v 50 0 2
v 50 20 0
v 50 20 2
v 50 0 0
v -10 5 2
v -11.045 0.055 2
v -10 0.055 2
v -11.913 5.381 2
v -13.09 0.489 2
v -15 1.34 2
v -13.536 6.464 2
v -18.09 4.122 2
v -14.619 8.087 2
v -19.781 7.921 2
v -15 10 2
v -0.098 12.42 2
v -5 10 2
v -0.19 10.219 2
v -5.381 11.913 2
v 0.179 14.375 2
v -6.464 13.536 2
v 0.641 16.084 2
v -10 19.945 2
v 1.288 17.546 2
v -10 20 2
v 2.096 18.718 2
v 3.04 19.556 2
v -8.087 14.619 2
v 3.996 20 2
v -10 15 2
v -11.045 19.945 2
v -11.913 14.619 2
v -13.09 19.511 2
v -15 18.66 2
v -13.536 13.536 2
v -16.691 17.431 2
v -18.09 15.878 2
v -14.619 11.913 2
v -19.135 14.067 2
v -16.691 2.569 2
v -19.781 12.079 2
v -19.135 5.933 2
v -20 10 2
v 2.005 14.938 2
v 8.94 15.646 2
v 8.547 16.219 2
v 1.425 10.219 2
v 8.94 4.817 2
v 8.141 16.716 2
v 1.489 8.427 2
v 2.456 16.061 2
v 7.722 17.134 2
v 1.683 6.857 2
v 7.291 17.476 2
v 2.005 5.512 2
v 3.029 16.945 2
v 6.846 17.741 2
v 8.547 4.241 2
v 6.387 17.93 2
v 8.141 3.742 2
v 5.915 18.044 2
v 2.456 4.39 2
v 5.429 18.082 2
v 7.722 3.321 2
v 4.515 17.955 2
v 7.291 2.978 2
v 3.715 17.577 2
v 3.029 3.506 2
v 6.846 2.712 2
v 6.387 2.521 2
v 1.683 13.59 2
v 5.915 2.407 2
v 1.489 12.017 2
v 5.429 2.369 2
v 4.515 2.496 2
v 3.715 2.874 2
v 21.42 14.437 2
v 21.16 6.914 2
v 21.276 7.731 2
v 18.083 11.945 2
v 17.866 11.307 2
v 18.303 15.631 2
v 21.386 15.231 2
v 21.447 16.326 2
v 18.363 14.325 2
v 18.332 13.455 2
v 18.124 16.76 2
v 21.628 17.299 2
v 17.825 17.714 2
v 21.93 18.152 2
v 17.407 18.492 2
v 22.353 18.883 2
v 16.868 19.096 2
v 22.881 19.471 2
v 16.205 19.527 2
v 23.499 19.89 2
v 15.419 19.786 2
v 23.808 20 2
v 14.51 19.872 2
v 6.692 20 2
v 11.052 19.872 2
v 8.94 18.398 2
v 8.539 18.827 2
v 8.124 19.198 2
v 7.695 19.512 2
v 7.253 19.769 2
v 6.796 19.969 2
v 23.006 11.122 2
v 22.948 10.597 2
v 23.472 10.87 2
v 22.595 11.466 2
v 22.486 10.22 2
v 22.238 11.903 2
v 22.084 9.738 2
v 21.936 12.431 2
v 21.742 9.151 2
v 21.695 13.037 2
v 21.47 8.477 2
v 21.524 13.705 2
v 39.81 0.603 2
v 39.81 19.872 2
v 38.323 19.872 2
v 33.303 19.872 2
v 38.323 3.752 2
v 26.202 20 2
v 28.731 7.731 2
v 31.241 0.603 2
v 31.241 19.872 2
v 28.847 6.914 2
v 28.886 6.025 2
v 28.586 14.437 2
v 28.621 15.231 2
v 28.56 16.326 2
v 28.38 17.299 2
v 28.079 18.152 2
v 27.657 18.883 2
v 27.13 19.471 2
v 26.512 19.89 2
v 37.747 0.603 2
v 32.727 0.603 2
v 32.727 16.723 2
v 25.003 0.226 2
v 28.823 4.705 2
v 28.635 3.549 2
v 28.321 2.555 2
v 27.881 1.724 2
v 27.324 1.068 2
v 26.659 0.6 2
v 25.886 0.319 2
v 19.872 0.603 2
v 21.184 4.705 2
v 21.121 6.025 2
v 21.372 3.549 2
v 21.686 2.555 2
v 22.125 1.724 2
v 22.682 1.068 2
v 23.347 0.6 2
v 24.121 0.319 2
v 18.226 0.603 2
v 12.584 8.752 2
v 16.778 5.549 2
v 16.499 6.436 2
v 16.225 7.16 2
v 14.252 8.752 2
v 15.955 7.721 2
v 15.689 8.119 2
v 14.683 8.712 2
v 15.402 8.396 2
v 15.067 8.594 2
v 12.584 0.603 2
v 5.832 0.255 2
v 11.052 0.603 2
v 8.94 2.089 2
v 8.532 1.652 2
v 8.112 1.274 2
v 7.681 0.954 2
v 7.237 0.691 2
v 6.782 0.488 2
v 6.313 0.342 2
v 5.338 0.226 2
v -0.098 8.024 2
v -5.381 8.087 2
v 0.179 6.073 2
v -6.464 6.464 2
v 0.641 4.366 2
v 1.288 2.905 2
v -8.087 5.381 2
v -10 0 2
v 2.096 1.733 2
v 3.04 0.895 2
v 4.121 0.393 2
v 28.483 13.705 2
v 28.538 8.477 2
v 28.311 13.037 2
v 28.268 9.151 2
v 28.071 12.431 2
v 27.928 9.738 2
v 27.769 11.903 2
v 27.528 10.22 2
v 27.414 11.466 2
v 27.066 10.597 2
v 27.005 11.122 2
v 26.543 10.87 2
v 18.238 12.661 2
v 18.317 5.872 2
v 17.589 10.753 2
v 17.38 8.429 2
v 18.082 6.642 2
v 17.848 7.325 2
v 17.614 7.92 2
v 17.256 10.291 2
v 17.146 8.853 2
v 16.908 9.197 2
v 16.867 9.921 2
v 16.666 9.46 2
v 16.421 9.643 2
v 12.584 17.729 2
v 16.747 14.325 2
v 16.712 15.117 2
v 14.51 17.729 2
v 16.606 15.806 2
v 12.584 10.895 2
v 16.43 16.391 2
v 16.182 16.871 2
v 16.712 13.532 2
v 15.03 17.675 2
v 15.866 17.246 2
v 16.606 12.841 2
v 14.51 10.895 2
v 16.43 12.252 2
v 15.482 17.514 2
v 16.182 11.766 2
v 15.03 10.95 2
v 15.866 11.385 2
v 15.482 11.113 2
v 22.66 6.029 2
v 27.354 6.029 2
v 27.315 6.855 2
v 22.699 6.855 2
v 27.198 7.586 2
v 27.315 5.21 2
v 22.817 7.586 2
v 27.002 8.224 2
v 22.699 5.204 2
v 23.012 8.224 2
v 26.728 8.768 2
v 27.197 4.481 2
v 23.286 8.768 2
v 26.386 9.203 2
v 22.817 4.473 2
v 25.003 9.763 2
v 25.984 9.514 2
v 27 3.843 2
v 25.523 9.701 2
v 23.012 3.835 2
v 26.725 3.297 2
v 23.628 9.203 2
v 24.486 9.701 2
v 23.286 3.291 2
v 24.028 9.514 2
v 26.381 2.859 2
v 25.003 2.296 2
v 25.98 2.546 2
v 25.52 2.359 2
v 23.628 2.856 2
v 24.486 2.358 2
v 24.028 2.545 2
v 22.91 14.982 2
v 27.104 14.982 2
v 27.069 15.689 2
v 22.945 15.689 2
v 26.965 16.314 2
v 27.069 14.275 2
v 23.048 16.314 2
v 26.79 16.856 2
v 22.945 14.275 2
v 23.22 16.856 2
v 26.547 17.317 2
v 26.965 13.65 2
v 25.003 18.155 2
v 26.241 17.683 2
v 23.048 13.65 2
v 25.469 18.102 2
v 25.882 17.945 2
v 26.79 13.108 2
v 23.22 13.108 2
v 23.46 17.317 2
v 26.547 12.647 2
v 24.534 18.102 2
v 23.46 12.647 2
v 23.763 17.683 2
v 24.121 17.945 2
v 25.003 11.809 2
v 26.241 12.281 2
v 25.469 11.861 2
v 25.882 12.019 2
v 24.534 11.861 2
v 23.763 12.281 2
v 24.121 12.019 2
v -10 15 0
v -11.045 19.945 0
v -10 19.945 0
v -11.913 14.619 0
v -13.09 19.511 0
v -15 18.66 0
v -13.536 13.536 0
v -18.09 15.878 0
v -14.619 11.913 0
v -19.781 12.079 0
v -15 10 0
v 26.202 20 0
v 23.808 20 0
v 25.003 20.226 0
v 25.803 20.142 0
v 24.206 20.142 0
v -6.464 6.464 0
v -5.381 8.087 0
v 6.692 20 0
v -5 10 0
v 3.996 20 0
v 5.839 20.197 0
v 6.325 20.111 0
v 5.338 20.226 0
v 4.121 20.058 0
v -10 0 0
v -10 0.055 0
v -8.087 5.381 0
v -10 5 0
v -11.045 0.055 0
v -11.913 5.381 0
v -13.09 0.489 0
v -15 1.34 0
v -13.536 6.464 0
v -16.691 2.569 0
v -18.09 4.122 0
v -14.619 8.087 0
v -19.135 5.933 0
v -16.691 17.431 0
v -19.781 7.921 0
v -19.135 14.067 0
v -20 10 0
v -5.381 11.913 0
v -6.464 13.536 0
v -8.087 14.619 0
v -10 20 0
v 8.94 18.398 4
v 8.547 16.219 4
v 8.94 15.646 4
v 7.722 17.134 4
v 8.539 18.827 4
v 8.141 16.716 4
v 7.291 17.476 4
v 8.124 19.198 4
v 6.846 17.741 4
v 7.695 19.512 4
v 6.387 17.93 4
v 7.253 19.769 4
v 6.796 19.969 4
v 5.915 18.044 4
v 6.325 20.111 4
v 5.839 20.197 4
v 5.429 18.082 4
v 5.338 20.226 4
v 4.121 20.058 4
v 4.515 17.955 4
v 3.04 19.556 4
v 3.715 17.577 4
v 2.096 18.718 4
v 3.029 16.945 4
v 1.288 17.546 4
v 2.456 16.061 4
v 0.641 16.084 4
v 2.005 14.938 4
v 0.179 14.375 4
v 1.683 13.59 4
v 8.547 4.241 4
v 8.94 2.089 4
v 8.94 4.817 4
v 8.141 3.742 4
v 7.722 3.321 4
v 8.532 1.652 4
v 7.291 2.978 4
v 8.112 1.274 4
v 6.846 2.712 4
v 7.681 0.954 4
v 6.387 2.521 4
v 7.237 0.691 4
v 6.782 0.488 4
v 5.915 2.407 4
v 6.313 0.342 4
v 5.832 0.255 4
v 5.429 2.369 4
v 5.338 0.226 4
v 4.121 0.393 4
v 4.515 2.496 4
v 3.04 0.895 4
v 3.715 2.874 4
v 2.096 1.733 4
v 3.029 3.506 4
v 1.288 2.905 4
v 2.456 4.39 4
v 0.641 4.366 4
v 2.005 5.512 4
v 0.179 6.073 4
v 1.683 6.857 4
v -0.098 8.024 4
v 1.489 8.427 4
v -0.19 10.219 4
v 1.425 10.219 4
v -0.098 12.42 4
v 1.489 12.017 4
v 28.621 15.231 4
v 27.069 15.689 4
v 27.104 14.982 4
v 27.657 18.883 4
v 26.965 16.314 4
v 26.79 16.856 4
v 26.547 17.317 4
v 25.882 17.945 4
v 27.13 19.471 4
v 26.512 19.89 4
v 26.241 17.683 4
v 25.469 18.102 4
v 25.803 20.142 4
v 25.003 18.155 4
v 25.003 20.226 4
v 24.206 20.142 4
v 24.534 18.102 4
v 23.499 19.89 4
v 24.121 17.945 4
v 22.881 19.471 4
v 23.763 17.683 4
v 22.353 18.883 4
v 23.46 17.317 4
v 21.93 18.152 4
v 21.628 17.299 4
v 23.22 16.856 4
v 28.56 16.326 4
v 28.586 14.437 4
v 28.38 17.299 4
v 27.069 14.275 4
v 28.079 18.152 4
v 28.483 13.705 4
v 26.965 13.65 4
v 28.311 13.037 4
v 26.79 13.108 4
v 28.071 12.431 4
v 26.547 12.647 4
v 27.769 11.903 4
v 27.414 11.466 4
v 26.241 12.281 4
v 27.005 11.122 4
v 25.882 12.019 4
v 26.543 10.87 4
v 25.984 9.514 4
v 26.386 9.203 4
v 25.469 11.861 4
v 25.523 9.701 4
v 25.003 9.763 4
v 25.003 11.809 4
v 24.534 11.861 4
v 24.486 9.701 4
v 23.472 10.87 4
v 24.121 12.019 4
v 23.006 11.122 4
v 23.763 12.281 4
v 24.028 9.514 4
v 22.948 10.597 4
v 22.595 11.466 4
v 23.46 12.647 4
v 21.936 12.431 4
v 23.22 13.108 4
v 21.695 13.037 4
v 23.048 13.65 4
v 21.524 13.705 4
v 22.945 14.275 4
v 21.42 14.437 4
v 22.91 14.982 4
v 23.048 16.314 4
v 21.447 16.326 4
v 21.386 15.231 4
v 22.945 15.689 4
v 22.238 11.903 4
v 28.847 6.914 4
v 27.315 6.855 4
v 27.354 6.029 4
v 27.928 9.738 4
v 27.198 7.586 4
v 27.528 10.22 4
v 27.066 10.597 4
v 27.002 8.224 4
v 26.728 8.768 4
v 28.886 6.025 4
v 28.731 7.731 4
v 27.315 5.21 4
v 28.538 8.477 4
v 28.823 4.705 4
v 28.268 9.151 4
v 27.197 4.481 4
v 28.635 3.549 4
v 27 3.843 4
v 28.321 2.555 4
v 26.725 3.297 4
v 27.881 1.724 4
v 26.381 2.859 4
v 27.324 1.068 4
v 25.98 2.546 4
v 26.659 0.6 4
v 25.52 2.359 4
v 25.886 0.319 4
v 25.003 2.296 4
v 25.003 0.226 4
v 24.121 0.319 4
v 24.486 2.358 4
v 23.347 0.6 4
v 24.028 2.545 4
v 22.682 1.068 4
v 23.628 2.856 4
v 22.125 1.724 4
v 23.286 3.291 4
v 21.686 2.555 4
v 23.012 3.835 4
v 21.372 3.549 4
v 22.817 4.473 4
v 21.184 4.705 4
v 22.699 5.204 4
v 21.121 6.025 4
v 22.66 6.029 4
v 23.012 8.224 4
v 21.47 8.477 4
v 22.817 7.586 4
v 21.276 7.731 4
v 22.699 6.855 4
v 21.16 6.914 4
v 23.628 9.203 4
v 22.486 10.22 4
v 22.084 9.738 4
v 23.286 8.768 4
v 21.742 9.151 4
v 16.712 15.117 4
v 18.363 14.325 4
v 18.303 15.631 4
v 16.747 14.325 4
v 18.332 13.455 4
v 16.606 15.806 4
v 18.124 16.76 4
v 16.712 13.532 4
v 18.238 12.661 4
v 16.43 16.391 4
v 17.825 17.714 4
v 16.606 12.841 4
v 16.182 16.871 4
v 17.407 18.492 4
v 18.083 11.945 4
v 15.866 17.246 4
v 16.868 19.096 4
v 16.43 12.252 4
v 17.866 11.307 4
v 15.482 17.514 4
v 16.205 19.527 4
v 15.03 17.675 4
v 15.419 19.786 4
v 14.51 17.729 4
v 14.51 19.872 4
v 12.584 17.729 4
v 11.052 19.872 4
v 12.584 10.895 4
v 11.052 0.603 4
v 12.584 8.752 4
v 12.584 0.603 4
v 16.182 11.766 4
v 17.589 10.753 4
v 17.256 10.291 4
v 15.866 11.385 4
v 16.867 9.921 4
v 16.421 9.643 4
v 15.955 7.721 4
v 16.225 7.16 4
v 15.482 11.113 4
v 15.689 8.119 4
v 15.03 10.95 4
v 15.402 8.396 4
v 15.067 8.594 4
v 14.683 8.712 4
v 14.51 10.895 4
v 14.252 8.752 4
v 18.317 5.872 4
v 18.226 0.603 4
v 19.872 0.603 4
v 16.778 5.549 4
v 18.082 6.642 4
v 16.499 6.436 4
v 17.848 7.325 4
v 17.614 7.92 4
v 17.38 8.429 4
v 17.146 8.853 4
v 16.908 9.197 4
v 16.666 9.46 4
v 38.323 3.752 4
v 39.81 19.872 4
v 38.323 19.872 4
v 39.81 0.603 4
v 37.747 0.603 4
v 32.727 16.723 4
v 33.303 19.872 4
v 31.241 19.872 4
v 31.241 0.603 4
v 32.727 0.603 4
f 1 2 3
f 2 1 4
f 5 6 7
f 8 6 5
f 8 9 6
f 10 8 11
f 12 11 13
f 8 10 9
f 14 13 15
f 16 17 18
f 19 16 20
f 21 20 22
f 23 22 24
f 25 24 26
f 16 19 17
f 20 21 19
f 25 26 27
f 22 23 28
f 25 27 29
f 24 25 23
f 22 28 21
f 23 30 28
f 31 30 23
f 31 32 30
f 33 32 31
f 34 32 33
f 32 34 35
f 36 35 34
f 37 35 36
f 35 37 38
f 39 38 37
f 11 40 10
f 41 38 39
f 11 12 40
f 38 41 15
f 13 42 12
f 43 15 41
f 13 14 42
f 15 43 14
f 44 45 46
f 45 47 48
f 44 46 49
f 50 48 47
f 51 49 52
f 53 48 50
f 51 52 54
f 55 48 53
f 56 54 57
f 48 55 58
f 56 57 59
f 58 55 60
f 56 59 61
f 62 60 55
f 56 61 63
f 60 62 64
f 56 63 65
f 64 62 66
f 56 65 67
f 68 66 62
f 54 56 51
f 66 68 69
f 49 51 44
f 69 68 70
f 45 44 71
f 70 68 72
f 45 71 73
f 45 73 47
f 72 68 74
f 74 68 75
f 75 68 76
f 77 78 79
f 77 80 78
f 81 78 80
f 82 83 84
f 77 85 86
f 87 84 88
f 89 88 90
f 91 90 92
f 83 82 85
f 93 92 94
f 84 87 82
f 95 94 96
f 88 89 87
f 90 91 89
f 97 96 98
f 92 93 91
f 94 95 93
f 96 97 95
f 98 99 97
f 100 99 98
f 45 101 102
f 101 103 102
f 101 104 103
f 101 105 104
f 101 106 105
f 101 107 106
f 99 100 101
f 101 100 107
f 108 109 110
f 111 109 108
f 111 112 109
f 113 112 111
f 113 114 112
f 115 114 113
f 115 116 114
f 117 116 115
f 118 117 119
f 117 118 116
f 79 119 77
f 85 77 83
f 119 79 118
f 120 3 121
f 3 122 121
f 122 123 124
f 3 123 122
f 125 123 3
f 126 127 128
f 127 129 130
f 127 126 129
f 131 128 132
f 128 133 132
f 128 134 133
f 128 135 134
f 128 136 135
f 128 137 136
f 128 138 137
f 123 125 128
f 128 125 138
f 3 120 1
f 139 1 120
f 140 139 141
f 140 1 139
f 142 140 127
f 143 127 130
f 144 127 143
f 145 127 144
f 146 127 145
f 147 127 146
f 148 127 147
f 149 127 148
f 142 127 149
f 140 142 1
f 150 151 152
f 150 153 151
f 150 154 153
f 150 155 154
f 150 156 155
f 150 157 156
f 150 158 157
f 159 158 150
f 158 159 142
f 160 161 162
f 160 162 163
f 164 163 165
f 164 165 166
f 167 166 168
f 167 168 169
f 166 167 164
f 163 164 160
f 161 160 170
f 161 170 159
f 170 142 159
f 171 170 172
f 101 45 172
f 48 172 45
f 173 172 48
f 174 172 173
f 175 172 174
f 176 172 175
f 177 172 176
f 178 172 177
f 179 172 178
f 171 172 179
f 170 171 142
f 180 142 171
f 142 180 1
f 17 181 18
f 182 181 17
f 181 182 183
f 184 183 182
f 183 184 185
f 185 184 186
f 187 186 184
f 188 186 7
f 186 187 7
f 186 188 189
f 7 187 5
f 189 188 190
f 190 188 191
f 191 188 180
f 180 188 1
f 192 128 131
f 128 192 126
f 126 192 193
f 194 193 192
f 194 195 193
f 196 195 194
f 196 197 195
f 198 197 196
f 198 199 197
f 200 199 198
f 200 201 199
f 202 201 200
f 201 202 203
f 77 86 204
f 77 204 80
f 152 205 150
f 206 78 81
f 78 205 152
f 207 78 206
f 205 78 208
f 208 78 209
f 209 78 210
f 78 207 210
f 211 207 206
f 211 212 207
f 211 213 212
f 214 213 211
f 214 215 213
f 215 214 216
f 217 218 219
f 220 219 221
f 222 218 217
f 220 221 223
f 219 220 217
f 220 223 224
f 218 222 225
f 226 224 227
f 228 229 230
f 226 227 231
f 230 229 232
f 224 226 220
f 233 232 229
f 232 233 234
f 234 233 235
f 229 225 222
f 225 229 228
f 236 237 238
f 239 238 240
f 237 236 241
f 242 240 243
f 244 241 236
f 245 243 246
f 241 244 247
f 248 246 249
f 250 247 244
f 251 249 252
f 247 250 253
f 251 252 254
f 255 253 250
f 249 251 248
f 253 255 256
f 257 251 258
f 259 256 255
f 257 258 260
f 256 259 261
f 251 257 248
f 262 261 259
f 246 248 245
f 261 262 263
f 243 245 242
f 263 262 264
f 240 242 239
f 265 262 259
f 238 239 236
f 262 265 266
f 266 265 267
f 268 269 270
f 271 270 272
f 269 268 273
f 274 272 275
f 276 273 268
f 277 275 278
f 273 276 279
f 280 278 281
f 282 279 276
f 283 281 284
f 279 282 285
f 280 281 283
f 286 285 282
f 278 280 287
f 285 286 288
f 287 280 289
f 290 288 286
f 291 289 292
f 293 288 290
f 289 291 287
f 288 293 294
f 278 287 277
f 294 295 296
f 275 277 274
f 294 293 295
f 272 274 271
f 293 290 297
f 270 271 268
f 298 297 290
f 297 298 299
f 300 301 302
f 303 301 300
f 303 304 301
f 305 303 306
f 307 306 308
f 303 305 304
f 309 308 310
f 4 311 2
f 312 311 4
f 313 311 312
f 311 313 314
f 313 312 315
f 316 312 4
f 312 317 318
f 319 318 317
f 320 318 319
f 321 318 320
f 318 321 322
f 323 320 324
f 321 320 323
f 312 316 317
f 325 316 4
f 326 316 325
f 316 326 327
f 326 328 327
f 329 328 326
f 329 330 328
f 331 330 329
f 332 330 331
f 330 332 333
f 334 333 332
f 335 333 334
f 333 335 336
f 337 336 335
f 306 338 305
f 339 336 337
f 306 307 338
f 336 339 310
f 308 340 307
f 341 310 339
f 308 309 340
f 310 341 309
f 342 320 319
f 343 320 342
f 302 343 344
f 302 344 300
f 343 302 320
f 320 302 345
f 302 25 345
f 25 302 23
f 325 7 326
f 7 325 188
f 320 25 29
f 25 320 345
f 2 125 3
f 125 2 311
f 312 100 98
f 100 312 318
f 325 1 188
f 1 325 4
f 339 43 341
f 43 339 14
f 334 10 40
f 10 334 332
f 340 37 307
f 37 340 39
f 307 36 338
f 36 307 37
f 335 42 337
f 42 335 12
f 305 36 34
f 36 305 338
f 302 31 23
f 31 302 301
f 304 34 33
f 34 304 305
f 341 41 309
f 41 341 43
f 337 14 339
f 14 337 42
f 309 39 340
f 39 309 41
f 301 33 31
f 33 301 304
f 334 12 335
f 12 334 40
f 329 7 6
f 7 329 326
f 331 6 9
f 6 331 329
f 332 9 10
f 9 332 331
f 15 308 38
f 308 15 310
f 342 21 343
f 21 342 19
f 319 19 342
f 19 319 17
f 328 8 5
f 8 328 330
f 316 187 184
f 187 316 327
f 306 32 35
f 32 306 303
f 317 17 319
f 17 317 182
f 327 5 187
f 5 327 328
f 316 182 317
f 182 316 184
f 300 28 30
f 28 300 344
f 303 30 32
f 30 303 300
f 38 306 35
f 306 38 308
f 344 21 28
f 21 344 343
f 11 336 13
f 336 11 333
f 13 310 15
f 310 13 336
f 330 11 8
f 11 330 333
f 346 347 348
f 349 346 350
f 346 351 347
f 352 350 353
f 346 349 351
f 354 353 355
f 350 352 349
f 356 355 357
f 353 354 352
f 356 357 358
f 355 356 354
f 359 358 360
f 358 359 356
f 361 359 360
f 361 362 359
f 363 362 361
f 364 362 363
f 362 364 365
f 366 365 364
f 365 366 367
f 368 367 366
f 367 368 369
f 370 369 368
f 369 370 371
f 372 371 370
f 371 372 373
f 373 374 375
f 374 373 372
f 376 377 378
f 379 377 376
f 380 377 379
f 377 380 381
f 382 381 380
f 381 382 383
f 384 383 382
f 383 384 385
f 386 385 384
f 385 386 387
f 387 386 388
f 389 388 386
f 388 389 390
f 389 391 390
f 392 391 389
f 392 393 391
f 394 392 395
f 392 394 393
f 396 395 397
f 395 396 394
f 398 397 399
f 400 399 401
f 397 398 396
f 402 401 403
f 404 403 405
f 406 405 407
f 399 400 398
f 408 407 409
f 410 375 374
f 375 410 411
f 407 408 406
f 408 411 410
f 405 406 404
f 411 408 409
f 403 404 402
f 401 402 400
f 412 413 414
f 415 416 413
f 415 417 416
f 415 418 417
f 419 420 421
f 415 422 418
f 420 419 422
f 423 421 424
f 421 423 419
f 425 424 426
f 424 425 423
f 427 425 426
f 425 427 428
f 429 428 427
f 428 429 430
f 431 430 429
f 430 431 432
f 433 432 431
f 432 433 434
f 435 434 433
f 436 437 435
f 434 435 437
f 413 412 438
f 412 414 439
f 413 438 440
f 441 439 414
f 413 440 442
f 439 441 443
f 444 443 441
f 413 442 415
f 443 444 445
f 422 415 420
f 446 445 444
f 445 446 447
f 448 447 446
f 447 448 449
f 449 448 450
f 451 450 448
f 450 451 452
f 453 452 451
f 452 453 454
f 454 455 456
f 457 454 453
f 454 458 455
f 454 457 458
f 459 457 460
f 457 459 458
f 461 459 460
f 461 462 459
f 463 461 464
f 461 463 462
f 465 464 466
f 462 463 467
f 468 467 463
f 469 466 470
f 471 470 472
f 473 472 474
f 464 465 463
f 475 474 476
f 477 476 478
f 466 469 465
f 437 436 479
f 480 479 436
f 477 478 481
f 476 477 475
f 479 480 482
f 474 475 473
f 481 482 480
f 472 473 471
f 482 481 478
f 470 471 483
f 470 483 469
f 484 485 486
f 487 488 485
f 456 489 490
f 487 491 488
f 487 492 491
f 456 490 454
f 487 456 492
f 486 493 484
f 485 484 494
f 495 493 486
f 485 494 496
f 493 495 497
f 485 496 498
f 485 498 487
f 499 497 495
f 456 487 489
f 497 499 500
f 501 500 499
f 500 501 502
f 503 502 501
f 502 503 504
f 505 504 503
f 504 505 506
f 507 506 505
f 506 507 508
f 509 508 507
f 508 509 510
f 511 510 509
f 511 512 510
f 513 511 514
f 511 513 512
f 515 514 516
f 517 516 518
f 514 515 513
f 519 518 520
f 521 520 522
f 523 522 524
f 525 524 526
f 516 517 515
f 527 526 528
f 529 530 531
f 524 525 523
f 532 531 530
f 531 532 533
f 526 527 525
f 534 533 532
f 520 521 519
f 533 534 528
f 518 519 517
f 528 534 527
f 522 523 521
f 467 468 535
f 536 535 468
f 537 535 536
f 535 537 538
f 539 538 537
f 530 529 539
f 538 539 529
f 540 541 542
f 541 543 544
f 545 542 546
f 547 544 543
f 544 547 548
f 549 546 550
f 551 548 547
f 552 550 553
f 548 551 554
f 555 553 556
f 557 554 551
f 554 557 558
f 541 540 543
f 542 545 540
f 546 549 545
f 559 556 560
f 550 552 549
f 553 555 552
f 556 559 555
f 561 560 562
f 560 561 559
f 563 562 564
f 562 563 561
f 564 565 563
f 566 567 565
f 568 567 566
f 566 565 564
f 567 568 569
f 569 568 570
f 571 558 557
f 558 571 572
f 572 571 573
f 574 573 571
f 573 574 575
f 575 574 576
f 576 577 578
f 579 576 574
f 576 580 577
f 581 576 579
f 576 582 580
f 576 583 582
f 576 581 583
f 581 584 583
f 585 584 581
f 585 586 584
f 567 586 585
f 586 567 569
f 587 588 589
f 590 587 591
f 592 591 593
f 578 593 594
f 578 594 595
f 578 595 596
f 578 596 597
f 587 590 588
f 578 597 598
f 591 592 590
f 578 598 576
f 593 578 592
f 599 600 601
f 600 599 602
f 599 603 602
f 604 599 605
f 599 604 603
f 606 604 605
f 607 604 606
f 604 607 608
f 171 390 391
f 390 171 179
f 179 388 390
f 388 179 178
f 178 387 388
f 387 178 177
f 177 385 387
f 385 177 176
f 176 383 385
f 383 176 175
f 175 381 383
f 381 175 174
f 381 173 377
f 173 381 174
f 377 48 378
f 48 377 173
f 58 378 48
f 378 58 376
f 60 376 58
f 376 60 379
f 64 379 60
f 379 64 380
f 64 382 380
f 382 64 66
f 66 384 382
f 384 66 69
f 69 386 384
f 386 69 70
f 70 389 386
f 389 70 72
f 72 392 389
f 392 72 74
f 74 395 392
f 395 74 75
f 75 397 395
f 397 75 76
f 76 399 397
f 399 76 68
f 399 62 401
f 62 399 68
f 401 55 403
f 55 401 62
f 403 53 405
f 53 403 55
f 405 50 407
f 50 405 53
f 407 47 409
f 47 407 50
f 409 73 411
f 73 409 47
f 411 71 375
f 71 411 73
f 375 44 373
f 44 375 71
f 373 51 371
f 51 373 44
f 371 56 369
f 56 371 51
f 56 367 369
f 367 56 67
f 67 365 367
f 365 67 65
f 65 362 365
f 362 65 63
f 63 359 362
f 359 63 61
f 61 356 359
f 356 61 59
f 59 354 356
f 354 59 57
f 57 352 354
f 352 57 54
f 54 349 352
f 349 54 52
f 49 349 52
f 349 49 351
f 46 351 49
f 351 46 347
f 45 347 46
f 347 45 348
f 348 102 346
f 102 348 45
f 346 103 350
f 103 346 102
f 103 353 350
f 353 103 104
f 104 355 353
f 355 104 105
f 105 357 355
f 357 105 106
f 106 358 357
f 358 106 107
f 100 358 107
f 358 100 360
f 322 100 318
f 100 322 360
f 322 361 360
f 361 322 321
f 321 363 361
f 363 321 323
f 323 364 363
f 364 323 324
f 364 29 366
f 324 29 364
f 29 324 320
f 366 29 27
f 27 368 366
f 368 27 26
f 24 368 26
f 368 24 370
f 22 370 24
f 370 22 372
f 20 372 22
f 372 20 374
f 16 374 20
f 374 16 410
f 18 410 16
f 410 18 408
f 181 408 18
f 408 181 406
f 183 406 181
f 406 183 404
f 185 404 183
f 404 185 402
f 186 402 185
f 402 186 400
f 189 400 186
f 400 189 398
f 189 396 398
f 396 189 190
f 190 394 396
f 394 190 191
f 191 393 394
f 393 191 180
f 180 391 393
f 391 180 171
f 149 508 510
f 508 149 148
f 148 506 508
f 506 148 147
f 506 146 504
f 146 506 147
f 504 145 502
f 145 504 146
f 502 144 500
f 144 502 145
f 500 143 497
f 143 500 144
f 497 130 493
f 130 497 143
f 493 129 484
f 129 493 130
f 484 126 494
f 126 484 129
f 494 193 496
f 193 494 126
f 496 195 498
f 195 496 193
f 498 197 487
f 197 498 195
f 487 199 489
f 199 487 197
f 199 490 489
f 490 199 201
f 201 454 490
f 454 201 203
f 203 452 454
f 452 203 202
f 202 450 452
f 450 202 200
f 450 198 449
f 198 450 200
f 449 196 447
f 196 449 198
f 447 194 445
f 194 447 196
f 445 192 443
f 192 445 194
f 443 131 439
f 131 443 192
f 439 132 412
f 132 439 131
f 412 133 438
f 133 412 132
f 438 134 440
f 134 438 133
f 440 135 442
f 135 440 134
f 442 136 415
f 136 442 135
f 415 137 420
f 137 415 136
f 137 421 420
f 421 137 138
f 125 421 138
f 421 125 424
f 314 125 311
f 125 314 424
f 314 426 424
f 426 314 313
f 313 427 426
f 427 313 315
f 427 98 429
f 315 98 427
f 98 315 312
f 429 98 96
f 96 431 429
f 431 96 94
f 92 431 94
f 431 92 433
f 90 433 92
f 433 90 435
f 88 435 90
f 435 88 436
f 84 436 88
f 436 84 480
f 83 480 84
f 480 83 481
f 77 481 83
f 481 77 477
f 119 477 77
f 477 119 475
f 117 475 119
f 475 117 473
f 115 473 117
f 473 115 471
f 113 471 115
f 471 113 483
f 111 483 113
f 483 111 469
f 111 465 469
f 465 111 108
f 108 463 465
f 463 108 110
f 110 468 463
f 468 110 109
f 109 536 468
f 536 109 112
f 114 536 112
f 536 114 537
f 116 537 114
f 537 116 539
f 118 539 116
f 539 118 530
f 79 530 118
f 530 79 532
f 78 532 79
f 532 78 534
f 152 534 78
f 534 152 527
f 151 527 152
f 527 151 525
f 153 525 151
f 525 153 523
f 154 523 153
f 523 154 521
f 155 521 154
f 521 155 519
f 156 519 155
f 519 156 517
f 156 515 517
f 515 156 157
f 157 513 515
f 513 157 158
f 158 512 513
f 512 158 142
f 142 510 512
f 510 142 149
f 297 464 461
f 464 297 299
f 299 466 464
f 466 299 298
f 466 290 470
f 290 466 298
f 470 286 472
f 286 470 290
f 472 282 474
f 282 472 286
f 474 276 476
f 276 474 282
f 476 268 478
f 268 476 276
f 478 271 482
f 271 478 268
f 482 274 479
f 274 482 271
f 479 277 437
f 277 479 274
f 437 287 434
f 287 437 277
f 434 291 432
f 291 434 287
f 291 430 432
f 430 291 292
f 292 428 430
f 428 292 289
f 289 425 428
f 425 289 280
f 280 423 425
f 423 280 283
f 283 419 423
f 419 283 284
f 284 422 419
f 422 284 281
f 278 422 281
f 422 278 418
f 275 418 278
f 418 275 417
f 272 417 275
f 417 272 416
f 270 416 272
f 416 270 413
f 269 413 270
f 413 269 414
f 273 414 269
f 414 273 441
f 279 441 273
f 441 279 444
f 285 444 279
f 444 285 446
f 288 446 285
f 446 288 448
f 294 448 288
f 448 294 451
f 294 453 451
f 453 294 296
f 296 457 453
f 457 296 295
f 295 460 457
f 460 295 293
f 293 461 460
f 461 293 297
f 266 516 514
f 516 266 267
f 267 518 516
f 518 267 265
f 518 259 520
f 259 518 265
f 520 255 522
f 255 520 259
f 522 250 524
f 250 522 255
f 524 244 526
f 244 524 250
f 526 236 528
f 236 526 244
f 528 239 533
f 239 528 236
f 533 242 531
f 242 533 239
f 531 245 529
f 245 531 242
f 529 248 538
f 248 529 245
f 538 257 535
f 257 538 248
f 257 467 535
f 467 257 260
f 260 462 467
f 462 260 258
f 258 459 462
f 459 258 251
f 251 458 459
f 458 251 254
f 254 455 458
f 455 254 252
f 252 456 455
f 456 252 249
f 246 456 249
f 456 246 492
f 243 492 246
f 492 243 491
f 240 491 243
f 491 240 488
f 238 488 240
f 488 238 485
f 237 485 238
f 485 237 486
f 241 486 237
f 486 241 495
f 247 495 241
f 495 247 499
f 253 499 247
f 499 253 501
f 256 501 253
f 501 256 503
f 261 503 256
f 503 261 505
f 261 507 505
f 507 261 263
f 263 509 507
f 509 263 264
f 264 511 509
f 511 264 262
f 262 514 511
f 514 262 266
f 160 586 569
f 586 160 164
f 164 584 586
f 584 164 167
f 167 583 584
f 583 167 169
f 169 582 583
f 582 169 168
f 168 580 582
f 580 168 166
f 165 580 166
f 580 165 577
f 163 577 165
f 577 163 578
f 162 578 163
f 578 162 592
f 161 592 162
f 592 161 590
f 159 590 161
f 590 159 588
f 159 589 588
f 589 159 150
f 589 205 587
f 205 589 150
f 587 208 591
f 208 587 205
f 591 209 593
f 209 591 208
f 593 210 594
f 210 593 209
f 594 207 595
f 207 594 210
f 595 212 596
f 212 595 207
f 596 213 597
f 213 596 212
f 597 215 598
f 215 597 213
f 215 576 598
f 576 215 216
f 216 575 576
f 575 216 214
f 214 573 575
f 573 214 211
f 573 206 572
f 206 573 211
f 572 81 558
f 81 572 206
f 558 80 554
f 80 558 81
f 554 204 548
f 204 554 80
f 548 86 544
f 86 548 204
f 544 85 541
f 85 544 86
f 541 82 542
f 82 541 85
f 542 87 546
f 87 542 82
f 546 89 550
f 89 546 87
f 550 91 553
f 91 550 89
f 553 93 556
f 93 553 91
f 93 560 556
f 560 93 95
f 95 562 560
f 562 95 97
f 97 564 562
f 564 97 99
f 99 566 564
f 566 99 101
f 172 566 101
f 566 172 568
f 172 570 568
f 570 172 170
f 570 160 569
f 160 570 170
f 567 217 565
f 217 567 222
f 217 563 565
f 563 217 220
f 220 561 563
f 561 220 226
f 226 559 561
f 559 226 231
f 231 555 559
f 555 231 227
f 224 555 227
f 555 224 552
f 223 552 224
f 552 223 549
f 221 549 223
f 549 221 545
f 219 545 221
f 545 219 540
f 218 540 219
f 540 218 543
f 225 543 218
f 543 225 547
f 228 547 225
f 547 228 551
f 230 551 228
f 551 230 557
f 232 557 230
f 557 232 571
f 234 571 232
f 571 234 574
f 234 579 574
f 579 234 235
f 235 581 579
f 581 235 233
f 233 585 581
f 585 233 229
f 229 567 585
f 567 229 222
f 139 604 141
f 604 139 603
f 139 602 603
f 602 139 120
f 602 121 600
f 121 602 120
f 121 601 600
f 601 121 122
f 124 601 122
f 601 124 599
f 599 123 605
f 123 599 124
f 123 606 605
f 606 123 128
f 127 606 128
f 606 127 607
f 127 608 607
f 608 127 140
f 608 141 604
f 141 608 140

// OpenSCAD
module Keychain(name, length, width, height) {
  linear_extrude(height=height) {
    translate([length/2, width/2]) {
      resize([length, width]) {
        text(name, font="Chalkboard", halign="center", valign="center");
      }
    }
  }

  difference() {
    union() {
      translate([-width/2, 0, 0]) {
        cube([1.5*length, width, .5*height]);
      }
      translate([-width/2, width/2, 0]) {
        cylinder(d=width, h=.5*height);
      }
    }
    translate([-width/2, width/2, 0]) {
      cylinder(h=height+1, d=width/2, center=true);
    }
  }
}

Keychain("CR8N", 40, 20, 4);
